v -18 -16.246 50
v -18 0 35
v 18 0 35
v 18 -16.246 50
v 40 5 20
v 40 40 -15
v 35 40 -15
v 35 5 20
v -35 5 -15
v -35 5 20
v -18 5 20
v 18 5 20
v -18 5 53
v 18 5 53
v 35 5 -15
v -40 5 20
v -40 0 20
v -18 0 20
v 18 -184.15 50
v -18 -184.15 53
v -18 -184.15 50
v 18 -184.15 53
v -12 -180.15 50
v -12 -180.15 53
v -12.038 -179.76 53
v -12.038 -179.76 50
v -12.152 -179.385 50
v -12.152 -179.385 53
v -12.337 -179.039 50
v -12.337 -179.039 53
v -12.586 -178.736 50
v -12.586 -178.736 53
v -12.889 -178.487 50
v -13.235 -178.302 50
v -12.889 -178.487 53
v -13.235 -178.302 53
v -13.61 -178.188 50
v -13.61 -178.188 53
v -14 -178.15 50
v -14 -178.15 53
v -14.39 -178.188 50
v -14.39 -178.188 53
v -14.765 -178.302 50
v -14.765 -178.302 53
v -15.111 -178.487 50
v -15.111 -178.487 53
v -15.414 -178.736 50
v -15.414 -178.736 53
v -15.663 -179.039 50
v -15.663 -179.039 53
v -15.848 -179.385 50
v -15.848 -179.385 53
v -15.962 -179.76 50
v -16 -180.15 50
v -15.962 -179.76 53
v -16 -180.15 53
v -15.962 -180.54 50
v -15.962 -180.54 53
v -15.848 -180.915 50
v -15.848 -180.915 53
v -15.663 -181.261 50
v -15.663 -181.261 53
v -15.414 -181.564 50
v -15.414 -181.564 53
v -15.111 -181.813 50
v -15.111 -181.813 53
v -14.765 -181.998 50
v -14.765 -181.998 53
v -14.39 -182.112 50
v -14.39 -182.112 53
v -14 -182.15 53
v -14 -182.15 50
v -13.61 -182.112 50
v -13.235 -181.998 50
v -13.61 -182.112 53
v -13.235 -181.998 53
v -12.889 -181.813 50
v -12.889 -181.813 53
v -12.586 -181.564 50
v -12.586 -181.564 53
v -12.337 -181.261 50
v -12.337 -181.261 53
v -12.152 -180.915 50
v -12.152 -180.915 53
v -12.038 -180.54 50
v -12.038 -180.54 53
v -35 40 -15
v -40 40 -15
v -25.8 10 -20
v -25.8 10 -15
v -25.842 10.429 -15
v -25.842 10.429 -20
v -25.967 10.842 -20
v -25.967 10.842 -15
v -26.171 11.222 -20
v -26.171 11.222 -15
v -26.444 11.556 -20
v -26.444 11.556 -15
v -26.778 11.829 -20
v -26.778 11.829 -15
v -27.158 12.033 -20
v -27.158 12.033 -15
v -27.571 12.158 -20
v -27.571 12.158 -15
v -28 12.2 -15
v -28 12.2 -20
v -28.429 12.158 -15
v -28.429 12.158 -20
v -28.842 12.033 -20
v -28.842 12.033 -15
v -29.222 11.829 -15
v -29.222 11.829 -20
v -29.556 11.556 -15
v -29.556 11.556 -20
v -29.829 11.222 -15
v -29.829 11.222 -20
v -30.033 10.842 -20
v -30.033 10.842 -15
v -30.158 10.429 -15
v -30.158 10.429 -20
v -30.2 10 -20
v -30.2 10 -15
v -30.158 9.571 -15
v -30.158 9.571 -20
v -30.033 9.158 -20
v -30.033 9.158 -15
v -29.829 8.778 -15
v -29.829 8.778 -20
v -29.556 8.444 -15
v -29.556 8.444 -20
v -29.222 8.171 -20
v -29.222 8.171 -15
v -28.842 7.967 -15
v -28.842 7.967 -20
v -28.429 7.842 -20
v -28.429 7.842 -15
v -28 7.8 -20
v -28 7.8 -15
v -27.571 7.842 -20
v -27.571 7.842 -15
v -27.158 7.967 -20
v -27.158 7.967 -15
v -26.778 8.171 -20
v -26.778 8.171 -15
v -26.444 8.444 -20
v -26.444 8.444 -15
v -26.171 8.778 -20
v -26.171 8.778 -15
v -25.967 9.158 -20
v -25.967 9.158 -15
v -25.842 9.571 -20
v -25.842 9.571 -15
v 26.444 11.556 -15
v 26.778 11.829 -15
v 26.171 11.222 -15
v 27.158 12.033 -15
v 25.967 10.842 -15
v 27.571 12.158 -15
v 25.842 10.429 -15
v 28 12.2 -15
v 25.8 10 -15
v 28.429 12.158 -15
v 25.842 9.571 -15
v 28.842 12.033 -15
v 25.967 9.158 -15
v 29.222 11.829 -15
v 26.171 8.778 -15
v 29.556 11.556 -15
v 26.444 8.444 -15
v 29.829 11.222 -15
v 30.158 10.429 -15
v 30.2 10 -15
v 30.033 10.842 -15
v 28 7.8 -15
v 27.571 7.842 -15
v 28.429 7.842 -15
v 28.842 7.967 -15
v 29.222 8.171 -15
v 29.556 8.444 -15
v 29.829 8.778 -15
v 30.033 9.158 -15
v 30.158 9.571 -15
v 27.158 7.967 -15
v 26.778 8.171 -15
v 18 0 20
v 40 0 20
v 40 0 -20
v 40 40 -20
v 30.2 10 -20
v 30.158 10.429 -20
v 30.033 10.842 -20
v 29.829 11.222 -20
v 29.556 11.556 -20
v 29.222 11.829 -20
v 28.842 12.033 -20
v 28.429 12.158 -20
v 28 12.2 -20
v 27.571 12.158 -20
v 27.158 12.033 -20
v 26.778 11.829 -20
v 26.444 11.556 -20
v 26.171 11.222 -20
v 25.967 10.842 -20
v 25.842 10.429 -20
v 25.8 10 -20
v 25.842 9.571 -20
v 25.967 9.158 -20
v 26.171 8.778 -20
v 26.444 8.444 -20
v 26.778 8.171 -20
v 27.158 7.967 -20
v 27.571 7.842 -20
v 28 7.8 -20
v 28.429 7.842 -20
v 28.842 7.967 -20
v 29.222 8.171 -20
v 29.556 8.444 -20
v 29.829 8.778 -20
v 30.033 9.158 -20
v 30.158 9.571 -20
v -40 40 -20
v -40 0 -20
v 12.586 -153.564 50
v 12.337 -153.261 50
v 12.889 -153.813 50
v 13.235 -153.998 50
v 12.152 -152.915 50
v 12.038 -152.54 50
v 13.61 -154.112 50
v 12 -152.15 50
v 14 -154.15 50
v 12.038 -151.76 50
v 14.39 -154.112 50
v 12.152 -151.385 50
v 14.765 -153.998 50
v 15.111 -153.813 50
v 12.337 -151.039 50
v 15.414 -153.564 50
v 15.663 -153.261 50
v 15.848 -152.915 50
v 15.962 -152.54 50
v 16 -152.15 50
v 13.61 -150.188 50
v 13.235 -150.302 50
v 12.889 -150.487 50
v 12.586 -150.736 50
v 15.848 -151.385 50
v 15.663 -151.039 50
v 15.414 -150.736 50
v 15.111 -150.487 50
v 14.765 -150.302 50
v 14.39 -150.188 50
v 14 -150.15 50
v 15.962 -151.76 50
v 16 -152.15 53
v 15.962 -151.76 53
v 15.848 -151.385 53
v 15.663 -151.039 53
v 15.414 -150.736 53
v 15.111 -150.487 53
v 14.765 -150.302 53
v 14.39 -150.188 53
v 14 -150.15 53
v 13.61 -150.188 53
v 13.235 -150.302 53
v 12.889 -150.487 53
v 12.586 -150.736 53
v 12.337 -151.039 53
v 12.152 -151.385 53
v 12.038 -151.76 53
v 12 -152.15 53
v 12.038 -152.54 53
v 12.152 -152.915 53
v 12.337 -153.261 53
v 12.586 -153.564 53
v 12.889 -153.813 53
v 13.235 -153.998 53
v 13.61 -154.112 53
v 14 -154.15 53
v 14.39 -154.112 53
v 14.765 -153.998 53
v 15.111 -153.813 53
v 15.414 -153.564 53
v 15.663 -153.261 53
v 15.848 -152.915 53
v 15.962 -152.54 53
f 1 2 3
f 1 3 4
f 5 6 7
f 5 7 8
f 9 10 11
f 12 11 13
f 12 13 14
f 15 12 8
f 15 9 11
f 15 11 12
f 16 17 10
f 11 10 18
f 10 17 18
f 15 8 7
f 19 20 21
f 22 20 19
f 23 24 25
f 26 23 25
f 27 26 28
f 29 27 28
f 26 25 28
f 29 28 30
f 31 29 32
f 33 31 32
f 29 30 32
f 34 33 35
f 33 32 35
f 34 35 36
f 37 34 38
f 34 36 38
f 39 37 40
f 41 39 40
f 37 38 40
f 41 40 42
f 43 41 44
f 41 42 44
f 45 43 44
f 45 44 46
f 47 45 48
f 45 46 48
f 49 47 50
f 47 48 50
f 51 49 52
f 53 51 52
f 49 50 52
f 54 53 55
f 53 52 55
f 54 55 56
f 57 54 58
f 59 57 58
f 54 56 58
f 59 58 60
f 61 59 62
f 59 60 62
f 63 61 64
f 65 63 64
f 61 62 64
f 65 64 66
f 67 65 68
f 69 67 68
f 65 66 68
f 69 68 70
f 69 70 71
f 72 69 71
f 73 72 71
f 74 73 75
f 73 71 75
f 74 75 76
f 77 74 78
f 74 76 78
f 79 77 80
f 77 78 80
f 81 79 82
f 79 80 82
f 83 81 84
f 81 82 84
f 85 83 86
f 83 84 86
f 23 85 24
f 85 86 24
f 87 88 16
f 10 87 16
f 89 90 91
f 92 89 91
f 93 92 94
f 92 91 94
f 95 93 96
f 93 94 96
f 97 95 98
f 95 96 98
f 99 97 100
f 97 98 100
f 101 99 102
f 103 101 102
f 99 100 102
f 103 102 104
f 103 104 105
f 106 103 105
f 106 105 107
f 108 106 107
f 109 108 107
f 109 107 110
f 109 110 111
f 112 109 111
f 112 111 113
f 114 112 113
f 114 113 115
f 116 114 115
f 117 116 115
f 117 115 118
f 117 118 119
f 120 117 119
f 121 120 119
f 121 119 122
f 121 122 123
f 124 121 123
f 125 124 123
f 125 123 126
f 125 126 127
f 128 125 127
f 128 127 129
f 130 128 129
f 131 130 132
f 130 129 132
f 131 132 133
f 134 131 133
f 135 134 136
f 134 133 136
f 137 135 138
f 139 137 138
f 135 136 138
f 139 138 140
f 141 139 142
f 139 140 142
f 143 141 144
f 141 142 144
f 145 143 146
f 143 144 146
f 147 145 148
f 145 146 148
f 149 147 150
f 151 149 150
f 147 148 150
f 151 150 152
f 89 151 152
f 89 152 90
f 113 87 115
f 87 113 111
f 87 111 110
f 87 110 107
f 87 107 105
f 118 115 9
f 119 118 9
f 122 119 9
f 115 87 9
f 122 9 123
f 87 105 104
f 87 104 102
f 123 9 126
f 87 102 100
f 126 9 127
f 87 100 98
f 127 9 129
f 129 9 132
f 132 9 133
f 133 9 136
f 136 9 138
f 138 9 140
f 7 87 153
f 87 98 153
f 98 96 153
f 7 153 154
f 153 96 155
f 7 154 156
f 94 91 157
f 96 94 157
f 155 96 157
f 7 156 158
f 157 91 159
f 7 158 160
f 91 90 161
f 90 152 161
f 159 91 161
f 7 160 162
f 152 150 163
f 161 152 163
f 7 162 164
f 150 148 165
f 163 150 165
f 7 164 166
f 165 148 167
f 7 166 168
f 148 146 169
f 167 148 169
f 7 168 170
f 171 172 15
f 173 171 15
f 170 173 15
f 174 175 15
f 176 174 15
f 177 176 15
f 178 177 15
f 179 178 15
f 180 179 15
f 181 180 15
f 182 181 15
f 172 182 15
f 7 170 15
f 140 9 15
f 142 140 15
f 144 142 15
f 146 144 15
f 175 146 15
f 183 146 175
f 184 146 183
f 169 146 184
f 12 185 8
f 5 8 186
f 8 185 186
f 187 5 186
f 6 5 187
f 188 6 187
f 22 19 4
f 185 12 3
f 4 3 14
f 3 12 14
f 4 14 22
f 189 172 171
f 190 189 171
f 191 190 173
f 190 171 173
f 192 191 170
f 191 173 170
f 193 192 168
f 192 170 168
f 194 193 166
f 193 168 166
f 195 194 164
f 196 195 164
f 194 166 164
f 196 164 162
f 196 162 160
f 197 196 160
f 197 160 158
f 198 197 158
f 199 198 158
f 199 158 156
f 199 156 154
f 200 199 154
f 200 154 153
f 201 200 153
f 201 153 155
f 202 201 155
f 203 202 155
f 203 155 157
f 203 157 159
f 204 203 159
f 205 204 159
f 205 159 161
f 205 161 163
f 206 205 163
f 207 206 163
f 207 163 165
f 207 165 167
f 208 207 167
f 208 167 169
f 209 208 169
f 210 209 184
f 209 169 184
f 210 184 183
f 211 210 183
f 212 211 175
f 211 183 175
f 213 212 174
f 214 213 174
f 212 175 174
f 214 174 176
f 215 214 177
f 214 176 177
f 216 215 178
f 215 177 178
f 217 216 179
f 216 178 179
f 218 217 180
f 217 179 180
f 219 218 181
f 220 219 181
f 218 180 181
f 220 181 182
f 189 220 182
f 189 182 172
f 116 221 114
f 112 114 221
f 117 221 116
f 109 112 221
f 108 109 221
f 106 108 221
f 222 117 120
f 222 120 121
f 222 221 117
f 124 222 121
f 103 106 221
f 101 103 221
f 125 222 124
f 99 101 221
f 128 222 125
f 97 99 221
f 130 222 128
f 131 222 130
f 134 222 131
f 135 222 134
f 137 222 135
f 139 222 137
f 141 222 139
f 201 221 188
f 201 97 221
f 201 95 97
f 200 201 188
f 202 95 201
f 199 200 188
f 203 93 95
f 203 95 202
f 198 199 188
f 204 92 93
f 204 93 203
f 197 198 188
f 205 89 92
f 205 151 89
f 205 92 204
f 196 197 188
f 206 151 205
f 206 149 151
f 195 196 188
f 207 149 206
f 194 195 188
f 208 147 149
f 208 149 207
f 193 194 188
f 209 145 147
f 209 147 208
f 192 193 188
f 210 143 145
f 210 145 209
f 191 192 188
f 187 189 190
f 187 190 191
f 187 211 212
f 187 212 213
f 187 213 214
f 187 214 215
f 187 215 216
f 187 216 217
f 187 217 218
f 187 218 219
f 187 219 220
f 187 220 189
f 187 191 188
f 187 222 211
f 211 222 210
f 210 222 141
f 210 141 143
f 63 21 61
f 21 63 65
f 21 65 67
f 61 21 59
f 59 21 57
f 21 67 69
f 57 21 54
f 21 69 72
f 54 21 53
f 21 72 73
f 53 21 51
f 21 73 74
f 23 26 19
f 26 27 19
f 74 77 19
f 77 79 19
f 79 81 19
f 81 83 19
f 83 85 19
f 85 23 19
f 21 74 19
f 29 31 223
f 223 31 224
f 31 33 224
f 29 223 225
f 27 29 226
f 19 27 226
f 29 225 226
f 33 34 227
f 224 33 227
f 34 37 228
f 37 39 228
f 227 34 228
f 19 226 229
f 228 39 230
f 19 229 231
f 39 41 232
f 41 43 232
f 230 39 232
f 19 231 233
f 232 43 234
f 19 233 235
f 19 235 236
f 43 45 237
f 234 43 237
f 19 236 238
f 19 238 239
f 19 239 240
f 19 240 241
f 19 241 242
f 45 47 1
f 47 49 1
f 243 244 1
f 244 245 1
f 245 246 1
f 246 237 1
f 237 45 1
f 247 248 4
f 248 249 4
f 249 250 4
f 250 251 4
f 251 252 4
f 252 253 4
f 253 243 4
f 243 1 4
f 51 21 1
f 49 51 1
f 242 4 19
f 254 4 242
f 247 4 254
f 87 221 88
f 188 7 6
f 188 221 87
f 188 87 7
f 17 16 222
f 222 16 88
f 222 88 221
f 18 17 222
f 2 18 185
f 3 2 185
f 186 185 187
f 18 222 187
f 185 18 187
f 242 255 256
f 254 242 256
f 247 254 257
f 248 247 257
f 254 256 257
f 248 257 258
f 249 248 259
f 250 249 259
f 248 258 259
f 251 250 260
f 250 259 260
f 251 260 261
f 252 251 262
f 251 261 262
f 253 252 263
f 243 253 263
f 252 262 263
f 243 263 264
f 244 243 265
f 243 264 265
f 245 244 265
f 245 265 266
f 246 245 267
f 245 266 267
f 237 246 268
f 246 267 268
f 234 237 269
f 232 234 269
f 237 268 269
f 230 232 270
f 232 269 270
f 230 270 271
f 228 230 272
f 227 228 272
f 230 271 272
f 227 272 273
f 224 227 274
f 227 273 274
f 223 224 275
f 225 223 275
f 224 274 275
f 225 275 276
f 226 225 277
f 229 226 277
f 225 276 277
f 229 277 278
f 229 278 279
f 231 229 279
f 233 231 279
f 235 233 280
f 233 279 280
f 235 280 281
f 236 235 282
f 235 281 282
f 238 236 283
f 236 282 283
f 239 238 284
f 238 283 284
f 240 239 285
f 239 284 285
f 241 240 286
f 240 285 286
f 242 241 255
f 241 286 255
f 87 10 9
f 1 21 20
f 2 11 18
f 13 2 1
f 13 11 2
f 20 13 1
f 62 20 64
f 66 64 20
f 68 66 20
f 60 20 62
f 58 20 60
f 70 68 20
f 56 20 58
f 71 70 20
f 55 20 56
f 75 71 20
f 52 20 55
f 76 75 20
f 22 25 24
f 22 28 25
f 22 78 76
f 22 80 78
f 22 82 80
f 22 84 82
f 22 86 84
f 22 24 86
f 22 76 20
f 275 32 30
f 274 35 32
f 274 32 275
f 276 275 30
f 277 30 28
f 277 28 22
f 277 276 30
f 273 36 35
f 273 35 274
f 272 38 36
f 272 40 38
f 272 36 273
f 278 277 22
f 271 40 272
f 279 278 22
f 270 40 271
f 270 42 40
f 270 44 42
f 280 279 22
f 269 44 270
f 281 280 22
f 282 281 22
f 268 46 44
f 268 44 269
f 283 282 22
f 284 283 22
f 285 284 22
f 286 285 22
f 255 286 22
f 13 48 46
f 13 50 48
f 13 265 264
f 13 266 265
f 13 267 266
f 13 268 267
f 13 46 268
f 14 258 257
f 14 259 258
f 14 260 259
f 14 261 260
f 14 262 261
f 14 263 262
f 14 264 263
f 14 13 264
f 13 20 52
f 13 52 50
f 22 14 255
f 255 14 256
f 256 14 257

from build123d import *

# Parameters (mm, degrees)
SKETCH1_W           = 80
SKETCH1_H           = 40
BOSS_EXTRUDE1_DEPTH = 5
SKETCH2_W           = 80
SKETCH2_H           = 5
BOSS_EXTRUDE2_DEPTH = 35
BOSS_EXTRUDE3_DEPTH = 5
BOSS_EXTRUDE4_DEPTH = 5
SKETCH6_R           = 2.2
CUT_EXTRUDE2_DEPTH  = 6
SKETCH7_W           = 36
SKETCH7_H           = 5
BOSS_EXTRUDE5_DEPTH = 33
SKETCH8_W           = 36
SKETCH8_H           = 3
BOSS_EXTRUDE6_DEPTH = 184.15
BOSS_EXTRUDE7_DEPTH = 36
SKETCH10_R          = 2
CUT_EXTRUDE3_DEPTH  = 3


with BuildPart() as part:
    # Sketch1 → Boss-Extrude1 (new body)
    with BuildSketch(Plane(origin=(0, 0, 0), x_dir=(1, 0, 0), z_dir=(0, 1, 0))):
        Rectangle(SKETCH1_W, SKETCH1_H)
    extrude(amount=BOSS_EXTRUDE1_DEPTH)

    # Sketch2 → Boss-Extrude2 (add)
    with BuildSketch(Plane(origin=(0, 5, 0), x_dir=(1, 0, 0), z_dir=(0, 1, 0))):
        with Locations((0, 17.5)):
            Rectangle(SKETCH2_W, SKETCH2_H)
    extrude(amount=BOSS_EXTRUDE2_DEPTH)

    # Sketch3 → Boss-Extrude3 (add)
    with BuildSketch(Plane.ZY.offset(40)):
        Polygon((-15, 40), (20, 5), (-15, 5), align=None)
    extrude(amount=-BOSS_EXTRUDE3_DEPTH)

    # Sketch4 → Boss-Extrude4 (add)
    with BuildSketch(Plane(origin=(40, 0, 0), x_dir=(0, 0, -1), z_dir=(1, 0, 0))):
        Polygon((15, 40), (-20, 5), (15, 5), align=None)
    extrude(amount=-BOSS_EXTRUDE4_DEPTH)

    # Sketch6 → Cut-Extrude2 (cut, through all)
    with BuildSketch(Plane.XY.offset(-15)):
        with Locations((-28, 10)):
            Circle(SKETCH6_R)
        with Locations((28, 10)):
            Circle(SKETCH6_R)
    extrude(amount=-CUT_EXTRUDE2_DEPTH, mode=Mode.SUBTRACT)

    # Sketch7 → Boss-Extrude5 (add)
    with BuildSketch(Plane.XY.offset(20)):
        with Locations((0, 2.5)):
            Rectangle(SKETCH7_W, SKETCH7_H)
    extrude(amount=BOSS_EXTRUDE5_DEPTH)

    # Sketch8 → Boss-Extrude6 (add)
    with BuildSketch(Plane.XZ):
        with Locations((0, 51.5)):
            Rectangle(SKETCH8_W, SKETCH8_H)
    extrude(amount=BOSS_EXTRUDE6_DEPTH)

    # Sketch9 → Boss-Extrude7 (add)
    with BuildSketch(Plane.ZY.offset(18)):
        Polygon((35, 0), (50, -16.245521775), (50, 0), align=None)
    extrude(amount=-BOSS_EXTRUDE7_DEPTH)

    # Sketch10 → Cut-Extrude3 (cut)
    with BuildSketch(Plane.XY.offset(53)):
        with Locations((14, -152.15)):
            Circle(SKETCH10_R)
        with Locations((-14, -180.15)):
            Circle(SKETCH10_R)
    extrude(amount=-CUT_EXTRUDE3_DEPTH, mode=Mode.SUBTRACT)


solid = part.part
